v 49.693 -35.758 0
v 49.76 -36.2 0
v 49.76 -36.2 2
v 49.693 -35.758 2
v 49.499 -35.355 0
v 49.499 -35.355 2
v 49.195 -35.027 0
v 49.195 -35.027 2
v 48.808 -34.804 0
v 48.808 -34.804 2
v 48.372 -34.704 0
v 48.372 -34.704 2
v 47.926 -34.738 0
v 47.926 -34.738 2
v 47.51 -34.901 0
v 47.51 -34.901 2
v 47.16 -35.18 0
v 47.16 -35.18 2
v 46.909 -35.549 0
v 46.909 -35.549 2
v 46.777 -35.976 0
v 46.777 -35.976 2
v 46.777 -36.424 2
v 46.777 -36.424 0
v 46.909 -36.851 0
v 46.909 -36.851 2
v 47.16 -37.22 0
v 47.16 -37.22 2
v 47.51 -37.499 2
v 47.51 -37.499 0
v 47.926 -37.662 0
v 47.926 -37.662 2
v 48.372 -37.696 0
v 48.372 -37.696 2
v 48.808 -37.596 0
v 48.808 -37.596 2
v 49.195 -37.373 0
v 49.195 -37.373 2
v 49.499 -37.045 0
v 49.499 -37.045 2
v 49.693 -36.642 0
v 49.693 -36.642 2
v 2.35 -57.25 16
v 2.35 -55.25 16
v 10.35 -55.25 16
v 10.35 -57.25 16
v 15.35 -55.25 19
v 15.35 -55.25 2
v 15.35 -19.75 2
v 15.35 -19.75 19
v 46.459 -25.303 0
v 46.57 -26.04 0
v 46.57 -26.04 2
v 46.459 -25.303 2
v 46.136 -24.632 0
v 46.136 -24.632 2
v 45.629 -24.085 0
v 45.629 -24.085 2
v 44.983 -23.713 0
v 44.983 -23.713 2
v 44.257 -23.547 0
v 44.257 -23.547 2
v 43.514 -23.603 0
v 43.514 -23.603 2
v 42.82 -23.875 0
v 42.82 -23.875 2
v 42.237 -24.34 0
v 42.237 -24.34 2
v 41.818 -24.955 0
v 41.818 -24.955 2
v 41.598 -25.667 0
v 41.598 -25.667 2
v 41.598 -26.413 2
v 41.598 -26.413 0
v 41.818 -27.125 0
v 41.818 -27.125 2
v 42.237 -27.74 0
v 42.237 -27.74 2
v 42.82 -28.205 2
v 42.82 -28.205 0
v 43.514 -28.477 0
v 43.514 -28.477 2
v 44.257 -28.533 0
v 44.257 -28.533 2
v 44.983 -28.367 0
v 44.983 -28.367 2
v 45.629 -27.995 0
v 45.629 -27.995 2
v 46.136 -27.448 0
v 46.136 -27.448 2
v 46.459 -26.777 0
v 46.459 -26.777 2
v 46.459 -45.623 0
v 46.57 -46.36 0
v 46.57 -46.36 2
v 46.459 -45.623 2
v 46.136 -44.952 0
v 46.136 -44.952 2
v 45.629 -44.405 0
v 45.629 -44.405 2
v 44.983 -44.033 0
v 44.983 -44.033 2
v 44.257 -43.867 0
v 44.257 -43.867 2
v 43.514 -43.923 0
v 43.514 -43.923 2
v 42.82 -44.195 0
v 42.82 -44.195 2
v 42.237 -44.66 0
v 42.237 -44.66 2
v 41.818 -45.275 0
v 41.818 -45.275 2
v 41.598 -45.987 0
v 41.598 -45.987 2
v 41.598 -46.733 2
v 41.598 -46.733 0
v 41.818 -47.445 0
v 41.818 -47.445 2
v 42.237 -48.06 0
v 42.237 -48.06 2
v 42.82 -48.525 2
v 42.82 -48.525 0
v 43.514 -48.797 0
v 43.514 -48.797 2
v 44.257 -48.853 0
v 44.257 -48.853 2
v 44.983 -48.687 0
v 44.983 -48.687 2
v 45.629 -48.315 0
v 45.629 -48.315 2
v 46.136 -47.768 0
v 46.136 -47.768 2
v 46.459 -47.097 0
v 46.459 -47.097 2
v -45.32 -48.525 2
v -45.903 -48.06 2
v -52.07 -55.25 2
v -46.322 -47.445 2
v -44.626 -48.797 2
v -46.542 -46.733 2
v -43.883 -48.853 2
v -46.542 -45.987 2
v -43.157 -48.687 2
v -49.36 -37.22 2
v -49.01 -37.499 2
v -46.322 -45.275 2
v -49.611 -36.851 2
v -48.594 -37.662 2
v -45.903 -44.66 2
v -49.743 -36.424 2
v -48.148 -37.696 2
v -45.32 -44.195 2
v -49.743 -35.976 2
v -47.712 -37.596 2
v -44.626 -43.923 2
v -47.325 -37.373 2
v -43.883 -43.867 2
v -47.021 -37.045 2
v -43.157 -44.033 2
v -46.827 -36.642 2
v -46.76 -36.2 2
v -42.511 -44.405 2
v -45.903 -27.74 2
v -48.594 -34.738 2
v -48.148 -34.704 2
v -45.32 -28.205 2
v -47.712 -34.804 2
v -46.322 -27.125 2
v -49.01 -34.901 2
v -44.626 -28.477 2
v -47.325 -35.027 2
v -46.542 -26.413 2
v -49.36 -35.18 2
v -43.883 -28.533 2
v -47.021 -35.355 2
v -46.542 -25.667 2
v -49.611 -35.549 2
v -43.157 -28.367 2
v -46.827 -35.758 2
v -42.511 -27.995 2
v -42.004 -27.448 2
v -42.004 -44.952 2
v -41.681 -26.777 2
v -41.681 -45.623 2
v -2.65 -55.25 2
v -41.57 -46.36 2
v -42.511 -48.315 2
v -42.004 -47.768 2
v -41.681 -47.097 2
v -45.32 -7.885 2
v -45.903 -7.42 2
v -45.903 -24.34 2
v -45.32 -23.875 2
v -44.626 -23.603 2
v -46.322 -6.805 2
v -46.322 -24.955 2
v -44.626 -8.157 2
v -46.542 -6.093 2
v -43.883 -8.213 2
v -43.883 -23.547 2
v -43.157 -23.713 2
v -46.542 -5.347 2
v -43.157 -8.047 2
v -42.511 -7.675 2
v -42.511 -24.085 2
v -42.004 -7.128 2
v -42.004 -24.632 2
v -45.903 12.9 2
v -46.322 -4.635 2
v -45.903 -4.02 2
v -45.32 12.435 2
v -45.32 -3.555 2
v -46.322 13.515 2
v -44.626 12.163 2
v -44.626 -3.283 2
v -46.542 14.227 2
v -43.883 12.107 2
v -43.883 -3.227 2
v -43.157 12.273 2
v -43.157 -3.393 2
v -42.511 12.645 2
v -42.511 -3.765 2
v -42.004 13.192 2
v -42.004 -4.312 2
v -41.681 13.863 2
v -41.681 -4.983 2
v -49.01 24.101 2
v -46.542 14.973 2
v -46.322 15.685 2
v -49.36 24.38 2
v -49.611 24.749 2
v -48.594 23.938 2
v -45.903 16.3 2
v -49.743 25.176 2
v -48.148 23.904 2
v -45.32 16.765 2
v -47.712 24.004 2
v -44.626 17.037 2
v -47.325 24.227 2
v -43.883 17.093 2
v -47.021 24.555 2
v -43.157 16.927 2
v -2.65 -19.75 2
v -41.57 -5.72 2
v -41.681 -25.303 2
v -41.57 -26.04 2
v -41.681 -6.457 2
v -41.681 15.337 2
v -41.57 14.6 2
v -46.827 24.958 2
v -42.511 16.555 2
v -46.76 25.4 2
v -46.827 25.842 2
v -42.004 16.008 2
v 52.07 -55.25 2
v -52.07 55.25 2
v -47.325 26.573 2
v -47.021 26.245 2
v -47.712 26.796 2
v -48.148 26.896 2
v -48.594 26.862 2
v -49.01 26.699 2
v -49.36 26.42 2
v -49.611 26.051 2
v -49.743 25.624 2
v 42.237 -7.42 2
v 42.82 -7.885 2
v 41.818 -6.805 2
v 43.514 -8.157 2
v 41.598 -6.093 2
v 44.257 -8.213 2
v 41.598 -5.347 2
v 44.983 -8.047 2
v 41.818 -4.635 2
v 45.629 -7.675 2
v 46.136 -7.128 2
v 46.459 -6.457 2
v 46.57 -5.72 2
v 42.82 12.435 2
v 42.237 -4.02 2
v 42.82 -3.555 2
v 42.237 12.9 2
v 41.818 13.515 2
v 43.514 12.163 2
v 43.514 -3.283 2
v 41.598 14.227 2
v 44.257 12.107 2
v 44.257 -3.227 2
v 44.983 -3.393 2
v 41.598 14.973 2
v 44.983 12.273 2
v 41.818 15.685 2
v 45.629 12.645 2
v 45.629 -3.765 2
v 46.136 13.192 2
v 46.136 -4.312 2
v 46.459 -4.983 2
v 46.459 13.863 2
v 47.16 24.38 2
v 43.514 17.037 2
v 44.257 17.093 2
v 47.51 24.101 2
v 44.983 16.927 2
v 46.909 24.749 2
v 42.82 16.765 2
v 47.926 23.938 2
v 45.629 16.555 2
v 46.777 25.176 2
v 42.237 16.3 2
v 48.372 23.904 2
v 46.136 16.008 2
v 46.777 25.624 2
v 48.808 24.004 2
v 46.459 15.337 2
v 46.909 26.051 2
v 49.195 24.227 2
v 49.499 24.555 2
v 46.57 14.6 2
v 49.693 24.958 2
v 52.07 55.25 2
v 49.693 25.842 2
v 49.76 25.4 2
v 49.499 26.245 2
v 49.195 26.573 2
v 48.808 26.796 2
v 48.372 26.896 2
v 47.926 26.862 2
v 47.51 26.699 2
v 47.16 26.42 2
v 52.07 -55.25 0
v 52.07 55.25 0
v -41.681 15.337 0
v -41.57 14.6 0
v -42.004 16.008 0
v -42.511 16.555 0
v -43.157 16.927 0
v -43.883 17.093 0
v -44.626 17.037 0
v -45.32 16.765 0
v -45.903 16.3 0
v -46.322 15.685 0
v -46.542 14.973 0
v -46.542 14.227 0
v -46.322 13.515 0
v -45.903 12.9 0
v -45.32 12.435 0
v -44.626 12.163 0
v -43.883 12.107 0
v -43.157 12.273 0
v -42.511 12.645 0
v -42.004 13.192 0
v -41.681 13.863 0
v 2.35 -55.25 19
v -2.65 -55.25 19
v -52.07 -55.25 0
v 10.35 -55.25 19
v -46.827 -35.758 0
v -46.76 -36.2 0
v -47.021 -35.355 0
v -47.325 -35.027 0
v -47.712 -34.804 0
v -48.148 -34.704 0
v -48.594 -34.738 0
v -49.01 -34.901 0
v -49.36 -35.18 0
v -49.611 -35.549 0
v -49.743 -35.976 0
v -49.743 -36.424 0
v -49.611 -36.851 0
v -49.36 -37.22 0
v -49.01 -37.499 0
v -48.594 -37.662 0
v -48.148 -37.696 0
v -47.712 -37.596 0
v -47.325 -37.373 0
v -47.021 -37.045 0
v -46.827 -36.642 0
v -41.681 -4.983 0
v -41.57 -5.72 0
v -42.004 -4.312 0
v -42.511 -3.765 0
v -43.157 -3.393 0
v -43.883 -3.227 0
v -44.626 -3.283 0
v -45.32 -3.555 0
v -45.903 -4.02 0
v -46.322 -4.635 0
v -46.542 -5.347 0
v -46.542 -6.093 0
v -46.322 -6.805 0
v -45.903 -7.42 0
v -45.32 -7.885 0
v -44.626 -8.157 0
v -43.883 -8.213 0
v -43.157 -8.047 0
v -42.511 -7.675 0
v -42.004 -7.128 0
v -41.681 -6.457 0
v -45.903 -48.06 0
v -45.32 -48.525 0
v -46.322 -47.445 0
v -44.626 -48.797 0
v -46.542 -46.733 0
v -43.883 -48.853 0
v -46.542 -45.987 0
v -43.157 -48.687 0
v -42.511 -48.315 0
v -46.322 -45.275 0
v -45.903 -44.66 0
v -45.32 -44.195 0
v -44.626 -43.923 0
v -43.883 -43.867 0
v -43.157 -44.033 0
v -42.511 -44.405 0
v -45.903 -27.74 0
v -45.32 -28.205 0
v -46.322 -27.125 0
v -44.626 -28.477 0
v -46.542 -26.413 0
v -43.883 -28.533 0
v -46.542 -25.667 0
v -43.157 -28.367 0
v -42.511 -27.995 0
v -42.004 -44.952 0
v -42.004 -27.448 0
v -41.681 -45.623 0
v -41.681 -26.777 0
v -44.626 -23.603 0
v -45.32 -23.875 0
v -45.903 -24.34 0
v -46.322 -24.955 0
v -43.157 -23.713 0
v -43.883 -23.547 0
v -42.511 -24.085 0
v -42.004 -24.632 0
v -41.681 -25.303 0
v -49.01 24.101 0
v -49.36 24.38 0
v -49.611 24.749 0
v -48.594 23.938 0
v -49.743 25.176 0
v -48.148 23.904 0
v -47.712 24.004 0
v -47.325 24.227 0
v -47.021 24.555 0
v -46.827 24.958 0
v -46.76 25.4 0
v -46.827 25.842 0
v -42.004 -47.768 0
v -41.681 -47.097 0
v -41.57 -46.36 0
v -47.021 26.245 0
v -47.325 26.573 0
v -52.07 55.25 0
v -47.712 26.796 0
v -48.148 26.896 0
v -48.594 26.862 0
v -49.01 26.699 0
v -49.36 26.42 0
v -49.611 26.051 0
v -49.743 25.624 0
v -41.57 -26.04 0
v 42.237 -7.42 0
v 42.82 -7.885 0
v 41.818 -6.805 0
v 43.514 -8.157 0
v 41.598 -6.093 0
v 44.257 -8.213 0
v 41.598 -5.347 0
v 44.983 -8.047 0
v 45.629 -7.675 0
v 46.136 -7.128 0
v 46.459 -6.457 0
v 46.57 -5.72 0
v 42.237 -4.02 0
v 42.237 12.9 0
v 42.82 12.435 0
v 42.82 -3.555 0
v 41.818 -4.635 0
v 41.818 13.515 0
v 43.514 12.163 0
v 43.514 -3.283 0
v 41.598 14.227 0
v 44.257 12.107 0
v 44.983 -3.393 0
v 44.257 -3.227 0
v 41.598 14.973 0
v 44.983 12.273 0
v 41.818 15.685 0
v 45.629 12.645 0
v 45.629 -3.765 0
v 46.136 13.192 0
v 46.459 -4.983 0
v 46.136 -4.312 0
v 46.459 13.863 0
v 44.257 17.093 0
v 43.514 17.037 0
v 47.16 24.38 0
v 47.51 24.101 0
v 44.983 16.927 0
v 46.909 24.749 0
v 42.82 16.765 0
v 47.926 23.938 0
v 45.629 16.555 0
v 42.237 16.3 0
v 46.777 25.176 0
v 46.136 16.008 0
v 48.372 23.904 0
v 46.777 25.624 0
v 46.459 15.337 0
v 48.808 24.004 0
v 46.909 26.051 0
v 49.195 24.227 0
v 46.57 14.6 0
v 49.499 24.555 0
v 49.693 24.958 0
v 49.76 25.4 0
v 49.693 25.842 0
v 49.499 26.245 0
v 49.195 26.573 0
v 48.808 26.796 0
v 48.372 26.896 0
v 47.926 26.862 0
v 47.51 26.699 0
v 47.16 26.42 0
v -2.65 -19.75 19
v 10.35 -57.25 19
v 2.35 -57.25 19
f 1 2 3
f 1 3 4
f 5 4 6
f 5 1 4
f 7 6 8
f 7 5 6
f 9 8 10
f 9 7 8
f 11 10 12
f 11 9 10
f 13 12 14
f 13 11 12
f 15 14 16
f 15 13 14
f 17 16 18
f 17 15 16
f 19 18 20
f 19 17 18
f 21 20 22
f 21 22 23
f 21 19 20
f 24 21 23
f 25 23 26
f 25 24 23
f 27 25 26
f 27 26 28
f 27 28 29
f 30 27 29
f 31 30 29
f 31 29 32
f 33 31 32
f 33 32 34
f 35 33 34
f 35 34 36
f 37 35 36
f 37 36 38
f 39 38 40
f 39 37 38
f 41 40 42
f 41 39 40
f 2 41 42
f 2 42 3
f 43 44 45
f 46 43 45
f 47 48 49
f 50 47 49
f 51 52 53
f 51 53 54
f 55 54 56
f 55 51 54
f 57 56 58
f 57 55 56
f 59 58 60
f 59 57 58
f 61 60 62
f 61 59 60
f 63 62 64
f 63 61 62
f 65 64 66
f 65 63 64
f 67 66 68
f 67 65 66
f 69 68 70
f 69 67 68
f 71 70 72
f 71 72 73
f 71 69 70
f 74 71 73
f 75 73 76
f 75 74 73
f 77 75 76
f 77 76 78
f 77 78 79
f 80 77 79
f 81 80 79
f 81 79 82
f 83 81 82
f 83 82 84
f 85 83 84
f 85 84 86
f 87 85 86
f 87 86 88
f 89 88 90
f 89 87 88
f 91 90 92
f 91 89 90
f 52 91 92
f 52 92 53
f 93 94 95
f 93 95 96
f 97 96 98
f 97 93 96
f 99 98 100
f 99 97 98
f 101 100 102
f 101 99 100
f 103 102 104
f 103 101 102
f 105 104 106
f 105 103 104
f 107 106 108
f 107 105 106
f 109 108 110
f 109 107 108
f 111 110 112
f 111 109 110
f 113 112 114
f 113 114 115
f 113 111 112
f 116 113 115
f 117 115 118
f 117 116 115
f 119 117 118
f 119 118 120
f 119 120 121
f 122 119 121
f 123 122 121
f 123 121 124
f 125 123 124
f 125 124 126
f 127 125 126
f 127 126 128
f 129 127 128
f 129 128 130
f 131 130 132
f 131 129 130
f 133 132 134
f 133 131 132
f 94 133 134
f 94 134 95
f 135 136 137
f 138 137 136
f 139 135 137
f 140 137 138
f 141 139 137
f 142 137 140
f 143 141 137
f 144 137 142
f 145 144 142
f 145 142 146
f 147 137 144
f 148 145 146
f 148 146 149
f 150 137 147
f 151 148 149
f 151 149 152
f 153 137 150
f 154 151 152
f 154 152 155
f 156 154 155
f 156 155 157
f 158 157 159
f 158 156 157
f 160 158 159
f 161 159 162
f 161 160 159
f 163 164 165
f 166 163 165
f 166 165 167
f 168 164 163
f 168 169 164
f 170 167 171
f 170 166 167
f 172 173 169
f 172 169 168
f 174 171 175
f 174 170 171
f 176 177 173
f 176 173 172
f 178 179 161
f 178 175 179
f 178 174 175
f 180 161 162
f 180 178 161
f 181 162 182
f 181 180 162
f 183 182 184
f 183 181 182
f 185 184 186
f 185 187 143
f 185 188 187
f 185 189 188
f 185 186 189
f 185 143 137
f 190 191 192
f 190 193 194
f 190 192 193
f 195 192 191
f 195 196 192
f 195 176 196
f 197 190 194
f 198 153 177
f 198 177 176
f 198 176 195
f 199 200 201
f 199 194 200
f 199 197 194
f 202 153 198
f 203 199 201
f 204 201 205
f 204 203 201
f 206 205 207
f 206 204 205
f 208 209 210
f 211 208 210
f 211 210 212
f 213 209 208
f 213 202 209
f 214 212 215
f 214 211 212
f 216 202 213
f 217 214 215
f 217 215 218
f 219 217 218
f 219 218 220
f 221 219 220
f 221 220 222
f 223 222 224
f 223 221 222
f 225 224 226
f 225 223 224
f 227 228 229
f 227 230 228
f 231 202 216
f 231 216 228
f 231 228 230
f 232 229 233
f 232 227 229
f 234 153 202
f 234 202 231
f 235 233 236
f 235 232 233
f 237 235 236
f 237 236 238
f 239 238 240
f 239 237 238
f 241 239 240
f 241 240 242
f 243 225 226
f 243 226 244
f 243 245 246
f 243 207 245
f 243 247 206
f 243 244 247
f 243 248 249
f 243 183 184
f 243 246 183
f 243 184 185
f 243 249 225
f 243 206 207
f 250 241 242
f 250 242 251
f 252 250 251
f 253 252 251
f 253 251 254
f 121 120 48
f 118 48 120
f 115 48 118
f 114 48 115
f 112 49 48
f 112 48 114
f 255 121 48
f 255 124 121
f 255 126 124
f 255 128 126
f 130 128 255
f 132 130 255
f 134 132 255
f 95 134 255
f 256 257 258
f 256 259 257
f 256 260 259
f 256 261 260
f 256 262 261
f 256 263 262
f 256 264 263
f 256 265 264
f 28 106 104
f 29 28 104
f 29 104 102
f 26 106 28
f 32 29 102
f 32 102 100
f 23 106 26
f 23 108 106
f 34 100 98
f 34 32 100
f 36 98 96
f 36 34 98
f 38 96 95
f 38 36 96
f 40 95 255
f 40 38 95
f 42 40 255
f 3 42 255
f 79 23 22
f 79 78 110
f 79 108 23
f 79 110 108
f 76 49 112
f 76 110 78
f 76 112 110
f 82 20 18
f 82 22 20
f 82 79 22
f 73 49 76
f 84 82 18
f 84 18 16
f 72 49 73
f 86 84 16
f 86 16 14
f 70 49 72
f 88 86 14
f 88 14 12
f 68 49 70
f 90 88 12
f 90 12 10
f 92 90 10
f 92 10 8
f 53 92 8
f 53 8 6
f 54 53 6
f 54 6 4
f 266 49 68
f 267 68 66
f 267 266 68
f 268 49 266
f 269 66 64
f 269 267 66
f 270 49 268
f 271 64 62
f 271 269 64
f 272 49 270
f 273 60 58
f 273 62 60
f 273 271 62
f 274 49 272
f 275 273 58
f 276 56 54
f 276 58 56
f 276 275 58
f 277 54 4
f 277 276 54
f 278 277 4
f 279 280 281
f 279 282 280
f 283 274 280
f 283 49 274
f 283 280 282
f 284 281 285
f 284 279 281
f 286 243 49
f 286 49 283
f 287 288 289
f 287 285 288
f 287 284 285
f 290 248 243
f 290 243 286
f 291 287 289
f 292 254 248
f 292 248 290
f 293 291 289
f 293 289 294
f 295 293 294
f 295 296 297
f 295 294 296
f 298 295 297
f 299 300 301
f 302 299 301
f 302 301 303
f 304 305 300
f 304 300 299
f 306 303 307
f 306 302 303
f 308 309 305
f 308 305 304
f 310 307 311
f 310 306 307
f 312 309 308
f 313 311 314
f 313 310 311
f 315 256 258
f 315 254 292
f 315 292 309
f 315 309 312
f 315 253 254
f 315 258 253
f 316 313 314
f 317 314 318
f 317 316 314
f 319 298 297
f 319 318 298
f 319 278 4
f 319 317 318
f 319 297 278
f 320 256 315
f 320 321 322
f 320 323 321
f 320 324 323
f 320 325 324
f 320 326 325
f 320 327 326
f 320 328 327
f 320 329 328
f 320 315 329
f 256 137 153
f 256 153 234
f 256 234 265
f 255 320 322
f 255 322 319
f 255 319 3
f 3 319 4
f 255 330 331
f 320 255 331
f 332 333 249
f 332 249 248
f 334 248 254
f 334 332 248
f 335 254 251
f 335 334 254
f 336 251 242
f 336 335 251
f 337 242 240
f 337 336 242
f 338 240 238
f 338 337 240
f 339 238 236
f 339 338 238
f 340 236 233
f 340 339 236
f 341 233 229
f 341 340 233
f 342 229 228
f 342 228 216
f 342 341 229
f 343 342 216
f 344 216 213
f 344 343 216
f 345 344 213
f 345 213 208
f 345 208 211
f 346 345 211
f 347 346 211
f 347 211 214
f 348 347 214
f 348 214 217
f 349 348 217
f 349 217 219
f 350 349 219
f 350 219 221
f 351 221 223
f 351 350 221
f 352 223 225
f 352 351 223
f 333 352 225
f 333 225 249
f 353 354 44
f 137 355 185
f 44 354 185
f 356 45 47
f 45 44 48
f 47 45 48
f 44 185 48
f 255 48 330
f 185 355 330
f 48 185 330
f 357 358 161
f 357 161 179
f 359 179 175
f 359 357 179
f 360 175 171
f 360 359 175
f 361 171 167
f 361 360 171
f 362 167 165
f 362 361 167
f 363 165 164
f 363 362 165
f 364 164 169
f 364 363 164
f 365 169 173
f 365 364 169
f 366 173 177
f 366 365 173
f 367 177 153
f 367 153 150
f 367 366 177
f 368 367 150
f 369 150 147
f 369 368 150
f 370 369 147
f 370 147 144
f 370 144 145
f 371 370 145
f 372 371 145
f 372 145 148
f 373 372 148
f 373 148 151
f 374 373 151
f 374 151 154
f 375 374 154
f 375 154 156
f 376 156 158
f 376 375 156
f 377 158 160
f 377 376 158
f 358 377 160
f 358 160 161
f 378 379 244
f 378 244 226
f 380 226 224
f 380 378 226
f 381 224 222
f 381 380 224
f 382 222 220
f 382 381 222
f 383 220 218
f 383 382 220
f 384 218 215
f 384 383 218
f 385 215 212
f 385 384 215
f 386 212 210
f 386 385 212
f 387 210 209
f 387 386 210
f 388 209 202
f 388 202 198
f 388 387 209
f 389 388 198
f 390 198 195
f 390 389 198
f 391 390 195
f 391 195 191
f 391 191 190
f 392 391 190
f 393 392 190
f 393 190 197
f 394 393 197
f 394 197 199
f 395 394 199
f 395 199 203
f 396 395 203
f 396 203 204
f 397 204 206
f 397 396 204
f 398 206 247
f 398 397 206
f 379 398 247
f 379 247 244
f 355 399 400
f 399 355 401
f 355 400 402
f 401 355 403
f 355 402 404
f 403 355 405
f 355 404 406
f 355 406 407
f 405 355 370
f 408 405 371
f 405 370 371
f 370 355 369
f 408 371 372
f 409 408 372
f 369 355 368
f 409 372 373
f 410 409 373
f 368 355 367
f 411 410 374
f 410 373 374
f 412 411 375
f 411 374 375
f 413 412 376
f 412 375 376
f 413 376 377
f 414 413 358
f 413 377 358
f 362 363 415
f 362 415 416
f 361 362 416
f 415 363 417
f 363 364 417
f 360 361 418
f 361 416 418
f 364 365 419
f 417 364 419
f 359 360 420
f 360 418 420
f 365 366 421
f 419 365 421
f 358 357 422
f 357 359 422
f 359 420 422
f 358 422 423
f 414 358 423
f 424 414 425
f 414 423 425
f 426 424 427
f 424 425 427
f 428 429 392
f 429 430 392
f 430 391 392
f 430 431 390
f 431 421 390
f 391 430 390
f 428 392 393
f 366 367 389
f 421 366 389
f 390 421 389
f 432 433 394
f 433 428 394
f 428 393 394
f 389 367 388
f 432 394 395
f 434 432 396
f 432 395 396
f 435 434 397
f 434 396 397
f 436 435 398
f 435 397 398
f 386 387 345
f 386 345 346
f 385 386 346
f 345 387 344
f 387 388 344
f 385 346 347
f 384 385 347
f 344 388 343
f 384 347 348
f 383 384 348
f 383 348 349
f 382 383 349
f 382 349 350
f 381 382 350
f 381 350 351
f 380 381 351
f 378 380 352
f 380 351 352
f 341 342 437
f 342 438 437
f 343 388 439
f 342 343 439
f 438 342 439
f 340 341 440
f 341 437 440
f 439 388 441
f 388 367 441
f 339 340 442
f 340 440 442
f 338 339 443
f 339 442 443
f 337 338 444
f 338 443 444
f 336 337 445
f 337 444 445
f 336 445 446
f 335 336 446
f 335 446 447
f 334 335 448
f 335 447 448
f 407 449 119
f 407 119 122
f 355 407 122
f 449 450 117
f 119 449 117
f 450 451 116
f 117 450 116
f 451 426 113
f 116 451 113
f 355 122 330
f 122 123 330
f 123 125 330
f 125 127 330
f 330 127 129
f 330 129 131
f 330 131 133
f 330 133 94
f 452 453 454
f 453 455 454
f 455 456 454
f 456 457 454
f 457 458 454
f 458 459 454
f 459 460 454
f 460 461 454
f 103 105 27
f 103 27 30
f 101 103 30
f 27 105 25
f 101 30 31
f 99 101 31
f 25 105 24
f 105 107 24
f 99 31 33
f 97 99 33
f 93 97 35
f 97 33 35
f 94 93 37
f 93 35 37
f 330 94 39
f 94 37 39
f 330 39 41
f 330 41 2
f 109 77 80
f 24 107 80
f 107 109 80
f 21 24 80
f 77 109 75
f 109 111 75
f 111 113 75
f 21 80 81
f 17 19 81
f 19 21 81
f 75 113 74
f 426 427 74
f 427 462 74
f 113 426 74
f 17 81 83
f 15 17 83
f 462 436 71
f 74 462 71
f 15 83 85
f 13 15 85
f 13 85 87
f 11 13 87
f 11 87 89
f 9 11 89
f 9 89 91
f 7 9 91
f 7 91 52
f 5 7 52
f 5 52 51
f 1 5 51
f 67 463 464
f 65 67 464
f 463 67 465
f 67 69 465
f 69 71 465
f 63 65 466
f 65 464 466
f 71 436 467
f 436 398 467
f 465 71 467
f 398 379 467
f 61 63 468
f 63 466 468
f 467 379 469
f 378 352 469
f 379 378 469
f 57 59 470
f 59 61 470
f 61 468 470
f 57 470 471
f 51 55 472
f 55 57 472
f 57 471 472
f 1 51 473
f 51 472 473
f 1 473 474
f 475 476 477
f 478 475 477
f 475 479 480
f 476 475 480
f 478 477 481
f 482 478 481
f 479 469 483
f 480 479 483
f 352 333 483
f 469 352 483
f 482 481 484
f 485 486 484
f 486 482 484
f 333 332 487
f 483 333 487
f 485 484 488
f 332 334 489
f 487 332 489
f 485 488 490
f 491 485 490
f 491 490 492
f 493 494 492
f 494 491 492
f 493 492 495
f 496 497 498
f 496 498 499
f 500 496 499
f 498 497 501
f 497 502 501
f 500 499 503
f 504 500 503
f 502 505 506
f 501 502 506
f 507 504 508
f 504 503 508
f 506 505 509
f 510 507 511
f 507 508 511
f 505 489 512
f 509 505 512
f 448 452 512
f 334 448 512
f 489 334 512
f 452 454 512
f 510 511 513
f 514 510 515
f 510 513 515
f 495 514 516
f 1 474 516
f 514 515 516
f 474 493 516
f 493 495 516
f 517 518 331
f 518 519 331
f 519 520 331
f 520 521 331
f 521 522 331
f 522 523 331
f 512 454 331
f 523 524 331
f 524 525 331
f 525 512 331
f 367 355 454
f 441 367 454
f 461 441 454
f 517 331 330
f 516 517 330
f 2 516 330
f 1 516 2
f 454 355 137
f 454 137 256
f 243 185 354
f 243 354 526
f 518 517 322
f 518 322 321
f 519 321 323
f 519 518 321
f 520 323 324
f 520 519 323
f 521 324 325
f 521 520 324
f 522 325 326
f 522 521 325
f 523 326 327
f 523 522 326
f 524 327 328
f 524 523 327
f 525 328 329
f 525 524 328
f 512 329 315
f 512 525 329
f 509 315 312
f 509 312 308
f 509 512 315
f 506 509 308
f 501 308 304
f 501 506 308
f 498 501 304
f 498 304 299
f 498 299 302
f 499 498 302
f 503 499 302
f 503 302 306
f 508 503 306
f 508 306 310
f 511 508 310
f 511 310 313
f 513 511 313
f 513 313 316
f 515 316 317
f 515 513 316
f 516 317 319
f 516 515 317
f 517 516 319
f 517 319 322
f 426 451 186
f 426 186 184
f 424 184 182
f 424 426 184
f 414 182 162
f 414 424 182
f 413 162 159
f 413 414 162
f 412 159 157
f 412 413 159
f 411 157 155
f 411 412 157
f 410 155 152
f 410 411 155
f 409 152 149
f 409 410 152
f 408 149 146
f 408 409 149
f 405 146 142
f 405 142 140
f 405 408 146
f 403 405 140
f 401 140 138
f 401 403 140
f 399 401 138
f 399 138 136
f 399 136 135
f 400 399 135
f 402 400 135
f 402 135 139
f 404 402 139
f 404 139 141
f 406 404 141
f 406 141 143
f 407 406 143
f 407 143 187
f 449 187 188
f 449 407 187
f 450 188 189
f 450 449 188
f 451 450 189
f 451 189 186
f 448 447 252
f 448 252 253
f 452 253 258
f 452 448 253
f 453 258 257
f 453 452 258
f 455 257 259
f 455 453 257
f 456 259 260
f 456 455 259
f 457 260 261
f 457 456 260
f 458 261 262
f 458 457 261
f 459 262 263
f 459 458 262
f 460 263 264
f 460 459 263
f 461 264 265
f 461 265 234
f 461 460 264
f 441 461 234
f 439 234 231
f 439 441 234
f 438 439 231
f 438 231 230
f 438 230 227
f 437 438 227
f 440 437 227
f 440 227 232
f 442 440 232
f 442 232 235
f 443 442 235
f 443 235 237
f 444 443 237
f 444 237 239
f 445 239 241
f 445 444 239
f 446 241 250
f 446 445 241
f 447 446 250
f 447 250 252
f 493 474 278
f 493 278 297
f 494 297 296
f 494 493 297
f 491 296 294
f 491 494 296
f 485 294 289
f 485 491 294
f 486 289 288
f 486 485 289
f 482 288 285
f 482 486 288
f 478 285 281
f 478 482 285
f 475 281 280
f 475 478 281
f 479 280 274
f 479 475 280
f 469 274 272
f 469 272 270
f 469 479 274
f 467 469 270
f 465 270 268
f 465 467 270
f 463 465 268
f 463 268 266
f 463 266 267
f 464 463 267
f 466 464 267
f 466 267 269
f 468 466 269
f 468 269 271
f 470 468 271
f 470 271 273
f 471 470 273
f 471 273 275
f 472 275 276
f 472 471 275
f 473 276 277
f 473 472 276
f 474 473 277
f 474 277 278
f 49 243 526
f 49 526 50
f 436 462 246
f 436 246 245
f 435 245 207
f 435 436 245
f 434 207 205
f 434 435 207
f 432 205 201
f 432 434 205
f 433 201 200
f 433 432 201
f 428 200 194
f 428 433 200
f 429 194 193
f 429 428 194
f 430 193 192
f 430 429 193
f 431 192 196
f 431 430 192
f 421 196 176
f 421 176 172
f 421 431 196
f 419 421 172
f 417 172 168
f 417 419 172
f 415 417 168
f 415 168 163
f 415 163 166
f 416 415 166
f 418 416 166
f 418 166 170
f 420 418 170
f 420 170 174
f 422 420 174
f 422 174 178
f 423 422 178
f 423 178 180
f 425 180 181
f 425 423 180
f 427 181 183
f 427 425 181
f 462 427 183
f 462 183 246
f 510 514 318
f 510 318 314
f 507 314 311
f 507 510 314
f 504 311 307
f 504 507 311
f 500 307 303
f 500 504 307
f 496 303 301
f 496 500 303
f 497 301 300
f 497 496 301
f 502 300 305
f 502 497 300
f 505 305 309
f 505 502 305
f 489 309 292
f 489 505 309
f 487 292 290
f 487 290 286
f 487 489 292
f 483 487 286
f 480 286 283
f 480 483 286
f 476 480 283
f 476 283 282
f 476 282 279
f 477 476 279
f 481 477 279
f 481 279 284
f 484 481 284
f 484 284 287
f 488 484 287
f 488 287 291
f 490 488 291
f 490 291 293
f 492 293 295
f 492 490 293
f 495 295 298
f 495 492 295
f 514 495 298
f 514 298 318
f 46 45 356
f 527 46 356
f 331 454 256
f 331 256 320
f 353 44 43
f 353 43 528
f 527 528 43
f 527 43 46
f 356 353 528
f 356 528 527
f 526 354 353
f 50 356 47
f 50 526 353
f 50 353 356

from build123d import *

# Parameters (mm, degrees)
F0_W     = 104.14
F0_H     = 110.5
F0_R     = 2.5
F0_R_2   = 1.5
F1_DEPTH = 2
F3_W     = 18
F3_H     = 35.5
F4_DEPTH = 17
F6_W     = 8
F6_H     = 3
F7_DEPTH = 2


with BuildPart() as f1:
    # F0 (on Top) → F1 (new body)
    with BuildSketch(Plane.XY):
        Rectangle(F0_W, F0_H)
        with Locations((-44.07, -46.36)):
            Circle(F0_R, mode=Mode.SUBTRACT)
        with Locations((-48.26, -36.2)):
            Circle(F0_R_2, mode=Mode.SUBTRACT)
        with Locations((-44.07, -26.04)):
            Circle(F0_R, mode=Mode.SUBTRACT)
        with Locations((-44.07, -5.72)):
            Circle(F0_R, mode=Mode.SUBTRACT)
        with Locations((44.07, -46.36)):
            Circle(F0_R, mode=Mode.SUBTRACT)
        with Locations((48.26, -36.2)):
            Circle(F0_R_2, mode=Mode.SUBTRACT)
        with Locations((44.07, -26.04)):
            Circle(F0_R, mode=Mode.SUBTRACT)
        with Locations((44.07, -5.72)):
            Circle(F0_R, mode=Mode.SUBTRACT)
        with Locations((-44.07, 14.6)):
            Circle(F0_R, mode=Mode.SUBTRACT)
        with Locations((-48.26, 25.4)):
            Circle(F0_R_2, mode=Mode.SUBTRACT)
        with Locations((44.07, 14.6)):
            Circle(F0_R, mode=Mode.SUBTRACT)
        with Locations((48.26, 25.4)):
            Circle(F0_R_2, mode=Mode.SUBTRACT)
    extrude(amount=F1_DEPTH)

    # F3 (on offset) → F4 (join)
    with BuildSketch(Plane.XY.offset(2)):
        with Locations((6.35, -37.5)):
            Rectangle(F3_W, F3_H)
    extrude(amount=F4_DEPTH)

    # F6 (on offset) → F7 (join)
    with BuildSketch(Plane.XZ.offset(55.25)):
        with Locations((6.35, 17.5)):
            Rectangle(F6_W, F6_H)
    extrude(amount=F7_DEPTH)


solid = f1.part
